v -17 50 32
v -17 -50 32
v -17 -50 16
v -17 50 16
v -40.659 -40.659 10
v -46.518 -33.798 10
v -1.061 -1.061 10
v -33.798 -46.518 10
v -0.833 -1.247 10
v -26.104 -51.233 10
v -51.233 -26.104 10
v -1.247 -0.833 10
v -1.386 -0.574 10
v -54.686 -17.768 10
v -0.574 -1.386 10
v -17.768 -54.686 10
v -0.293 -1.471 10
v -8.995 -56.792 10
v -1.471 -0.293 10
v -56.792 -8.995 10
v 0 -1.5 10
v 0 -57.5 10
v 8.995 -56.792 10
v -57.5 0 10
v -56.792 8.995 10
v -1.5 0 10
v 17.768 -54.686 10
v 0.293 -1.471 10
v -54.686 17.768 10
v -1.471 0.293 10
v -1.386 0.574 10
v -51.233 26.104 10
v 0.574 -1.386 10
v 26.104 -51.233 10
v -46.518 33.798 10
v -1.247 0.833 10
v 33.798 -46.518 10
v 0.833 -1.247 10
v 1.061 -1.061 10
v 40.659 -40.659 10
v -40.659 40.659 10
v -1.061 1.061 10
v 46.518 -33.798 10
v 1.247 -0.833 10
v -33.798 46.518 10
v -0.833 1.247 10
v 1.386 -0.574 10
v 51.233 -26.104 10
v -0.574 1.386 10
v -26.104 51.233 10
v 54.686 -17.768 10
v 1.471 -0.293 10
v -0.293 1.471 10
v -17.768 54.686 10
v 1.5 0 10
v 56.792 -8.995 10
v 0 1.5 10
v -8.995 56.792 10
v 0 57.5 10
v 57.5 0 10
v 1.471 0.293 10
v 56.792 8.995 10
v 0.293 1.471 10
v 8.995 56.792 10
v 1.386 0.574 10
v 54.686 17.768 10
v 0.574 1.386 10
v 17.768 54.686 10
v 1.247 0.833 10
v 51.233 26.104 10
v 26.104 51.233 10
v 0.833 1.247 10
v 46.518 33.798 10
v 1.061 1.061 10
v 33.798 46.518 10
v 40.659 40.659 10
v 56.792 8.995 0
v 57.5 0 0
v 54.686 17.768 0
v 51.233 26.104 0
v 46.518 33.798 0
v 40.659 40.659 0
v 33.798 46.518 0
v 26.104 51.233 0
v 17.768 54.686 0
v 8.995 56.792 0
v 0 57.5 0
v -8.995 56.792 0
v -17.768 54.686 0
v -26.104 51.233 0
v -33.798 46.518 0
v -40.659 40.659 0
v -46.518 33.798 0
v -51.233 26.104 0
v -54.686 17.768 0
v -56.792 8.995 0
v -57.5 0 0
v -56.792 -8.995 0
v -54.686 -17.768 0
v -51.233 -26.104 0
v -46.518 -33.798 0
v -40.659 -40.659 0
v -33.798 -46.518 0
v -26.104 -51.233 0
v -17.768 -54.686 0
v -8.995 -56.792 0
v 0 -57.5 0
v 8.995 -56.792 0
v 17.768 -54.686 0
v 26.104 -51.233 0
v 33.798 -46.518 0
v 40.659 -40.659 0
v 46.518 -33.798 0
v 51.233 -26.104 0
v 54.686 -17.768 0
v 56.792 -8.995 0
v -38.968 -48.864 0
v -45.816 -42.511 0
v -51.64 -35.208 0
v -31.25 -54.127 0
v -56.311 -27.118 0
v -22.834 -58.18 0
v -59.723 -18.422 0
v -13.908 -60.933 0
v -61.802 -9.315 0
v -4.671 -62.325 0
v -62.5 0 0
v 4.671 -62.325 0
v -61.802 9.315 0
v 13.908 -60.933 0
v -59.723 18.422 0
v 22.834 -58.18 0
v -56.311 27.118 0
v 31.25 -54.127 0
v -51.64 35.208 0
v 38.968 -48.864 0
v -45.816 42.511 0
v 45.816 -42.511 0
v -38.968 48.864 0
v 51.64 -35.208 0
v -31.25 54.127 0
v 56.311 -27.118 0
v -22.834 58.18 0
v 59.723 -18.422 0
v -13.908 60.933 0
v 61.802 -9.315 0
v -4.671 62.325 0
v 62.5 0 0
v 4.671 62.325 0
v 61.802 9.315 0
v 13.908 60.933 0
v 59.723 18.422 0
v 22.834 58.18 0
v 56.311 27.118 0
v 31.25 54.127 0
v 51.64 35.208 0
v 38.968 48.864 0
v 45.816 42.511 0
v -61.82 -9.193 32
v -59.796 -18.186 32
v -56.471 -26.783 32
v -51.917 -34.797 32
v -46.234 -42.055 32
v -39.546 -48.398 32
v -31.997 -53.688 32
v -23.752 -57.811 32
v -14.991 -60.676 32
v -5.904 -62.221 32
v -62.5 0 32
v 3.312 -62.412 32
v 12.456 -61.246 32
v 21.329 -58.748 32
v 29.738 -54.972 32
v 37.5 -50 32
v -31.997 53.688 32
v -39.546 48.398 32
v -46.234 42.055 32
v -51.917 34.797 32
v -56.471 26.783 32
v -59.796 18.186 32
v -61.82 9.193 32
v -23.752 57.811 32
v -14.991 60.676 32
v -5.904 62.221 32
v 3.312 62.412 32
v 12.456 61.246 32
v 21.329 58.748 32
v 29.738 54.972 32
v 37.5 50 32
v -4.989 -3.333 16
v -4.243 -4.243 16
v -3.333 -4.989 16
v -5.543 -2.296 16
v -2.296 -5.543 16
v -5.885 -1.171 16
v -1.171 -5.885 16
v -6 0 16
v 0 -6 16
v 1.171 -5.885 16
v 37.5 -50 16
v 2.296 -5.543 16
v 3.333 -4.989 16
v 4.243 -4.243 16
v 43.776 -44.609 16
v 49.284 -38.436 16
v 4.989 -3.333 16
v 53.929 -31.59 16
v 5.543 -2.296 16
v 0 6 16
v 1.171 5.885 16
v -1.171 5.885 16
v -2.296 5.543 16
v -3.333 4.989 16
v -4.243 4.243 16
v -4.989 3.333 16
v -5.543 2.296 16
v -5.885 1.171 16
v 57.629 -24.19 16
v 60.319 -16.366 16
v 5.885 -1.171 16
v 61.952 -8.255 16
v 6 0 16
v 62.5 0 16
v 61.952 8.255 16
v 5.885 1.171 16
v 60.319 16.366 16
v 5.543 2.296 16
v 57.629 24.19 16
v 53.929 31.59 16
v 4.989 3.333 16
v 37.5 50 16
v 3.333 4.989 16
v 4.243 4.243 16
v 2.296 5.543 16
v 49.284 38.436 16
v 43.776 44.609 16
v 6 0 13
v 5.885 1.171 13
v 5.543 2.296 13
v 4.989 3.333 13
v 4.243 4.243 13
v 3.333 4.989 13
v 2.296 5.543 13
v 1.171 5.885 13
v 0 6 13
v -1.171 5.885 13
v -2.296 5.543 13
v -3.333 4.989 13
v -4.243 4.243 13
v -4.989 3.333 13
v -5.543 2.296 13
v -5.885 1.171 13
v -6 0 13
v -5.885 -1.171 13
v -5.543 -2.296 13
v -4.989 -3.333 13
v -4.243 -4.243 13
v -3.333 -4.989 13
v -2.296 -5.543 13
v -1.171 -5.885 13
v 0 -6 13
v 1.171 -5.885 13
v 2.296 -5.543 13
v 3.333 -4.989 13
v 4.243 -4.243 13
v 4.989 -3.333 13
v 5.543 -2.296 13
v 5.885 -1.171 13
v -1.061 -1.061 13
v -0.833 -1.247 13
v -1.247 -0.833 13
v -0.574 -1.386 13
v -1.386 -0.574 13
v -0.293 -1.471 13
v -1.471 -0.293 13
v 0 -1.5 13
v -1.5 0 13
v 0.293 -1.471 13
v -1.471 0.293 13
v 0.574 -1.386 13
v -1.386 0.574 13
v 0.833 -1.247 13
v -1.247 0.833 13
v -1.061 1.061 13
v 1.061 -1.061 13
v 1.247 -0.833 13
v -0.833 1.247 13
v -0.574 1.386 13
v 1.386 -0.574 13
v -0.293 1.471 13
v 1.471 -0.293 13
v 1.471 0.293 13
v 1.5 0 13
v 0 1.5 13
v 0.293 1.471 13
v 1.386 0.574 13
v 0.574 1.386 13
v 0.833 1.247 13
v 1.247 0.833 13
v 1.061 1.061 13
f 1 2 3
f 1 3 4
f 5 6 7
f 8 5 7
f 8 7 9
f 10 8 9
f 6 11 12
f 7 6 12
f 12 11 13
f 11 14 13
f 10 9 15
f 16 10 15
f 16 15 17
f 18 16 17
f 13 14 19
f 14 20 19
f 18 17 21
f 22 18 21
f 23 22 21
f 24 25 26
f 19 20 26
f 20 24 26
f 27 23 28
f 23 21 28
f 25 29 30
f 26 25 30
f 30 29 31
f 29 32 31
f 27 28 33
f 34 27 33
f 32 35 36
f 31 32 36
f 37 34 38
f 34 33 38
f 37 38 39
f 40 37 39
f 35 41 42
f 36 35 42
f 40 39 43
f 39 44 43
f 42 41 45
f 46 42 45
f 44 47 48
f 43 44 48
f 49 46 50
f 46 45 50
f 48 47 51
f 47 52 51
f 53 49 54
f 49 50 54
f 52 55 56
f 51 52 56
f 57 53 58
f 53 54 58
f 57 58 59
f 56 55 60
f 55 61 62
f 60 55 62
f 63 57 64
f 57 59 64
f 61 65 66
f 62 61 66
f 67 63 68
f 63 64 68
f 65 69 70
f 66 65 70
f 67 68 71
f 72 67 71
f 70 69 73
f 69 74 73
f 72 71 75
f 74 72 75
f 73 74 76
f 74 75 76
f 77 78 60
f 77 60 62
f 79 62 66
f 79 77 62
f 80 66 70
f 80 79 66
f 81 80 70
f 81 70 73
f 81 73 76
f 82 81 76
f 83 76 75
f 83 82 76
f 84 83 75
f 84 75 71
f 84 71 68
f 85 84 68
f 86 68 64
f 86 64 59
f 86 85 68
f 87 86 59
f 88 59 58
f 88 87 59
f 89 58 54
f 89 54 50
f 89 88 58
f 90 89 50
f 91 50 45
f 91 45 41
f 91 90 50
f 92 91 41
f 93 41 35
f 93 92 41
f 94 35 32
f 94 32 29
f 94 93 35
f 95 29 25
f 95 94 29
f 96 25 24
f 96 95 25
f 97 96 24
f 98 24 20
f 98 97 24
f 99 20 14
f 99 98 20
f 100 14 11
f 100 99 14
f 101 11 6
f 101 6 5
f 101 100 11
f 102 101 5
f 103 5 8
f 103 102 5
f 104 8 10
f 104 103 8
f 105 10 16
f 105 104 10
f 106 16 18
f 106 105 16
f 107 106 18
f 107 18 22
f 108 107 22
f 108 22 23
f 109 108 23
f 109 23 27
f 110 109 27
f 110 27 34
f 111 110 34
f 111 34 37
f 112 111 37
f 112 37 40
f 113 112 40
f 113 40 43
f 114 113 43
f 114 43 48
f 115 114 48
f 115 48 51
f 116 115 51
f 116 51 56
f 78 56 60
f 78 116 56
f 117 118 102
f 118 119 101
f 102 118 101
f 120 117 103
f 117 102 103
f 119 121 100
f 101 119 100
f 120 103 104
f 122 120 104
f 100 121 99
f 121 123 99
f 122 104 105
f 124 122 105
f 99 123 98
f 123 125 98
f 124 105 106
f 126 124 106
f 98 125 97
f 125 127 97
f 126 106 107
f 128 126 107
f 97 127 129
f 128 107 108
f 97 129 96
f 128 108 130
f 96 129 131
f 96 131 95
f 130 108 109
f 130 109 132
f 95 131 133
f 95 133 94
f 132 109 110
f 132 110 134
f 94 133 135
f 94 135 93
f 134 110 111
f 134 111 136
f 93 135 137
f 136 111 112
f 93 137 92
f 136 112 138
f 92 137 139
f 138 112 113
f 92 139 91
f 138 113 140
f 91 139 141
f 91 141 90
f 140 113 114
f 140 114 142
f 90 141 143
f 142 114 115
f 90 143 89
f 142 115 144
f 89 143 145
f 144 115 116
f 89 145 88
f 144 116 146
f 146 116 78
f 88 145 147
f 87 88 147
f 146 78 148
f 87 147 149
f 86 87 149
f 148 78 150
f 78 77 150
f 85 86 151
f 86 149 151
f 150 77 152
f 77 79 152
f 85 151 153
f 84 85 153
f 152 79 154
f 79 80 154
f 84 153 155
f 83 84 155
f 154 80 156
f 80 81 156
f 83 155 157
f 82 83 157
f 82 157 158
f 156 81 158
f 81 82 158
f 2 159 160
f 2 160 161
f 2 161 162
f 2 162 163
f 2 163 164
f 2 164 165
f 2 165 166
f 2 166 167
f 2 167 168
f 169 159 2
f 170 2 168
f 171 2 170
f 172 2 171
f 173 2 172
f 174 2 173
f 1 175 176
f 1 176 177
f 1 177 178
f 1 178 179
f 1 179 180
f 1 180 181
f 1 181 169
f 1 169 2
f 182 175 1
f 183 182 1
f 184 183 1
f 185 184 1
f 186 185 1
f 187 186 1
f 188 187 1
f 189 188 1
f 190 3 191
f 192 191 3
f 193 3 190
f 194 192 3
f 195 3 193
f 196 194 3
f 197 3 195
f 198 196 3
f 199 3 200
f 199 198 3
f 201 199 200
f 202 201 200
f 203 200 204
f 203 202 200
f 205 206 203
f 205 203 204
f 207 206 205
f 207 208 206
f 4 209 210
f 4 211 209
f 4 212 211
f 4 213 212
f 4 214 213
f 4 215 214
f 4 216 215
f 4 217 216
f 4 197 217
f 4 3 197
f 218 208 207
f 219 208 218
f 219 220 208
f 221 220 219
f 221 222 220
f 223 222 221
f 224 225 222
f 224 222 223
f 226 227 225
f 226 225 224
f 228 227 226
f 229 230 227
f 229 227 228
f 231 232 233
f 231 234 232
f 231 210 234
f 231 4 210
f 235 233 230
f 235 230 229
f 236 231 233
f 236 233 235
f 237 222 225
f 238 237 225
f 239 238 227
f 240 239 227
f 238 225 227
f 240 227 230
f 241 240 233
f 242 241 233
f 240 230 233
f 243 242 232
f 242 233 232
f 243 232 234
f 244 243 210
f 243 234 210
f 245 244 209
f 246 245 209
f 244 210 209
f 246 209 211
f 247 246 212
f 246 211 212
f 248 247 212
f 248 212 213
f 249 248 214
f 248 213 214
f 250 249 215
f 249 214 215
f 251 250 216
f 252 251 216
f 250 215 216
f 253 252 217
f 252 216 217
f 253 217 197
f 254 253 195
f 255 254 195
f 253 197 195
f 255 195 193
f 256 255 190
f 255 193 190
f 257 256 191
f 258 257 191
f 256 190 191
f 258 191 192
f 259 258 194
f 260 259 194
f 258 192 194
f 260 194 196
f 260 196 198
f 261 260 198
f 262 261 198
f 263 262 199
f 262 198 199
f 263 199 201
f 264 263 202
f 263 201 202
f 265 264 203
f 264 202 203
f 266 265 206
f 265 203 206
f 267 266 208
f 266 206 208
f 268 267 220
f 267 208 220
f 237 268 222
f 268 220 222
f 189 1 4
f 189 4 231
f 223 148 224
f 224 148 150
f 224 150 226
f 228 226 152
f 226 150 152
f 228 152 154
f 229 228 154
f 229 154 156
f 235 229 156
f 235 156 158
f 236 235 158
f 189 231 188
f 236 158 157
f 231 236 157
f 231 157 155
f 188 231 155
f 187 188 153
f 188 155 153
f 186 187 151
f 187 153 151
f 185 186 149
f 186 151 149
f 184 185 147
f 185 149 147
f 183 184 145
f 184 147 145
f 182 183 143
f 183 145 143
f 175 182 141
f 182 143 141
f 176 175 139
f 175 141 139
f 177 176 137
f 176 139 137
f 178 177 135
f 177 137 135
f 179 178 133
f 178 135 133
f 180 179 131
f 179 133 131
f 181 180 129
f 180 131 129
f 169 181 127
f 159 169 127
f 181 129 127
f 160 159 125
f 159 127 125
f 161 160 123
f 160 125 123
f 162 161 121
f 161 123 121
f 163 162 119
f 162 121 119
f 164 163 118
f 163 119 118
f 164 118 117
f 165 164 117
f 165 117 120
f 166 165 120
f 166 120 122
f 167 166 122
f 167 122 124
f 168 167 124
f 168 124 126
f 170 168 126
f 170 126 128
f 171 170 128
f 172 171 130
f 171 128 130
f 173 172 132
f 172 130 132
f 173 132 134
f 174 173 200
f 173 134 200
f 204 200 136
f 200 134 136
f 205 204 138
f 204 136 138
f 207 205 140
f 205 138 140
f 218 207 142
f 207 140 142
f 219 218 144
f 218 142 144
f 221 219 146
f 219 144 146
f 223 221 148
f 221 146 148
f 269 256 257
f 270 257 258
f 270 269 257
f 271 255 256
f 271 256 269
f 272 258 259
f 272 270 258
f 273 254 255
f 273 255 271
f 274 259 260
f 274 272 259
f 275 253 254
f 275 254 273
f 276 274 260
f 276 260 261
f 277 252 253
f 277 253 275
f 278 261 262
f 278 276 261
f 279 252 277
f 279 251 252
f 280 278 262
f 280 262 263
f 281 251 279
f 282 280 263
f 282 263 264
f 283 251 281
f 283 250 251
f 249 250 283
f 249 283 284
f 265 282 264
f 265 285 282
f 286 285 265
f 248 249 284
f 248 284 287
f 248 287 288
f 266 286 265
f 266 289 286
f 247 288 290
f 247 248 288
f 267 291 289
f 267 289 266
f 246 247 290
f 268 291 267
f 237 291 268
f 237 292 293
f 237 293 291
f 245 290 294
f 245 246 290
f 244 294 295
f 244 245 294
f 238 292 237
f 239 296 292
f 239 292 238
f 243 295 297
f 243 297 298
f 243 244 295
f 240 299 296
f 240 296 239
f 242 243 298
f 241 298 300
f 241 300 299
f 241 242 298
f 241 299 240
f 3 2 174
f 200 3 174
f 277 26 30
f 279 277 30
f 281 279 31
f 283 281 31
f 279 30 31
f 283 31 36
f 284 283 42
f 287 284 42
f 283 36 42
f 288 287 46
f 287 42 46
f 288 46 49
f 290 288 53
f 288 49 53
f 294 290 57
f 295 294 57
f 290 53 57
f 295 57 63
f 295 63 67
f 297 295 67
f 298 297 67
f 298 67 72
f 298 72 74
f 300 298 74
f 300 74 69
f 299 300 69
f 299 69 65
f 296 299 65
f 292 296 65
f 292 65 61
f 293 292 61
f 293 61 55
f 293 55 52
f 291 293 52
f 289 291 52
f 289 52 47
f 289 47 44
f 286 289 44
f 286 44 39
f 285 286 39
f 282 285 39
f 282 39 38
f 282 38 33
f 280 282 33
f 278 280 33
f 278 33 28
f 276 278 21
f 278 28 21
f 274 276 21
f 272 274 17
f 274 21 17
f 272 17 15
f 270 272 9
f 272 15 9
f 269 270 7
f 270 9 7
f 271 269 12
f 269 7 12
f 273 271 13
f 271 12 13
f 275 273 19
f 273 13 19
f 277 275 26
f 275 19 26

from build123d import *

# Parameters (mm, degrees)
SKETCH1_R           = 62.5
SKETCH1_R_2         = 57.5
BOSS_EXTRUDE1_DEPTH = 10
SKETCH2_R           = 62.5
BOSS_EXTRUDE2_DEPTH = 22
SKETCH3_R           = 1.5
CUT_EXTRUDE1_DEPTH  = 92.08512502
SKETCH4_W           = 100
SKETCH4_H           = 100
CUT_EXTRUDE2_DEPTH  = 16
SKETCH6_R           = 6
CUT_EXTRUDE3_DEPTH  = 3


with BuildPart() as part:
    # Sketch1 → Boss-Extrude1 (new body)
    with BuildSketch(Plane.XY):
        Circle(SKETCH1_R)
        Circle(SKETCH1_R_2, mode=Mode.SUBTRACT)
    extrude(amount=BOSS_EXTRUDE1_DEPTH)

    # Sketch2 → Boss-Extrude2 (add)
    with BuildSketch(Plane.XY.offset(10)):
        Circle(SKETCH2_R)
    extrude(amount=BOSS_EXTRUDE2_DEPTH)

    # Sketch3 → Cut-Extrude1 (cut, through all)
    with BuildSketch(Plane(origin=(0, 0, 10), x_dir=(-1, 0, 0), z_dir=(0, 0, -1))):
        Circle(SKETCH3_R)
    extrude(amount=-CUT_EXTRUDE1_DEPTH, mode=Mode.SUBTRACT)

    # Sketch4 → Cut-Extrude2 (cut)
    with BuildSketch(Plane.XY.offset(32)):
        with Locations((33, 0)):
            Rectangle(SKETCH4_W, SKETCH4_H)
    extrude(amount=-CUT_EXTRUDE2_DEPTH, mode=Mode.SUBTRACT)

    # Sketch6 → Cut-Extrude3 (cut)
    with BuildSketch(Plane.XY.offset(16)):
        Circle(SKETCH6_R)
    extrude(amount=-CUT_EXTRUDE3_DEPTH, mode=Mode.SUBTRACT)


solid = part.part
